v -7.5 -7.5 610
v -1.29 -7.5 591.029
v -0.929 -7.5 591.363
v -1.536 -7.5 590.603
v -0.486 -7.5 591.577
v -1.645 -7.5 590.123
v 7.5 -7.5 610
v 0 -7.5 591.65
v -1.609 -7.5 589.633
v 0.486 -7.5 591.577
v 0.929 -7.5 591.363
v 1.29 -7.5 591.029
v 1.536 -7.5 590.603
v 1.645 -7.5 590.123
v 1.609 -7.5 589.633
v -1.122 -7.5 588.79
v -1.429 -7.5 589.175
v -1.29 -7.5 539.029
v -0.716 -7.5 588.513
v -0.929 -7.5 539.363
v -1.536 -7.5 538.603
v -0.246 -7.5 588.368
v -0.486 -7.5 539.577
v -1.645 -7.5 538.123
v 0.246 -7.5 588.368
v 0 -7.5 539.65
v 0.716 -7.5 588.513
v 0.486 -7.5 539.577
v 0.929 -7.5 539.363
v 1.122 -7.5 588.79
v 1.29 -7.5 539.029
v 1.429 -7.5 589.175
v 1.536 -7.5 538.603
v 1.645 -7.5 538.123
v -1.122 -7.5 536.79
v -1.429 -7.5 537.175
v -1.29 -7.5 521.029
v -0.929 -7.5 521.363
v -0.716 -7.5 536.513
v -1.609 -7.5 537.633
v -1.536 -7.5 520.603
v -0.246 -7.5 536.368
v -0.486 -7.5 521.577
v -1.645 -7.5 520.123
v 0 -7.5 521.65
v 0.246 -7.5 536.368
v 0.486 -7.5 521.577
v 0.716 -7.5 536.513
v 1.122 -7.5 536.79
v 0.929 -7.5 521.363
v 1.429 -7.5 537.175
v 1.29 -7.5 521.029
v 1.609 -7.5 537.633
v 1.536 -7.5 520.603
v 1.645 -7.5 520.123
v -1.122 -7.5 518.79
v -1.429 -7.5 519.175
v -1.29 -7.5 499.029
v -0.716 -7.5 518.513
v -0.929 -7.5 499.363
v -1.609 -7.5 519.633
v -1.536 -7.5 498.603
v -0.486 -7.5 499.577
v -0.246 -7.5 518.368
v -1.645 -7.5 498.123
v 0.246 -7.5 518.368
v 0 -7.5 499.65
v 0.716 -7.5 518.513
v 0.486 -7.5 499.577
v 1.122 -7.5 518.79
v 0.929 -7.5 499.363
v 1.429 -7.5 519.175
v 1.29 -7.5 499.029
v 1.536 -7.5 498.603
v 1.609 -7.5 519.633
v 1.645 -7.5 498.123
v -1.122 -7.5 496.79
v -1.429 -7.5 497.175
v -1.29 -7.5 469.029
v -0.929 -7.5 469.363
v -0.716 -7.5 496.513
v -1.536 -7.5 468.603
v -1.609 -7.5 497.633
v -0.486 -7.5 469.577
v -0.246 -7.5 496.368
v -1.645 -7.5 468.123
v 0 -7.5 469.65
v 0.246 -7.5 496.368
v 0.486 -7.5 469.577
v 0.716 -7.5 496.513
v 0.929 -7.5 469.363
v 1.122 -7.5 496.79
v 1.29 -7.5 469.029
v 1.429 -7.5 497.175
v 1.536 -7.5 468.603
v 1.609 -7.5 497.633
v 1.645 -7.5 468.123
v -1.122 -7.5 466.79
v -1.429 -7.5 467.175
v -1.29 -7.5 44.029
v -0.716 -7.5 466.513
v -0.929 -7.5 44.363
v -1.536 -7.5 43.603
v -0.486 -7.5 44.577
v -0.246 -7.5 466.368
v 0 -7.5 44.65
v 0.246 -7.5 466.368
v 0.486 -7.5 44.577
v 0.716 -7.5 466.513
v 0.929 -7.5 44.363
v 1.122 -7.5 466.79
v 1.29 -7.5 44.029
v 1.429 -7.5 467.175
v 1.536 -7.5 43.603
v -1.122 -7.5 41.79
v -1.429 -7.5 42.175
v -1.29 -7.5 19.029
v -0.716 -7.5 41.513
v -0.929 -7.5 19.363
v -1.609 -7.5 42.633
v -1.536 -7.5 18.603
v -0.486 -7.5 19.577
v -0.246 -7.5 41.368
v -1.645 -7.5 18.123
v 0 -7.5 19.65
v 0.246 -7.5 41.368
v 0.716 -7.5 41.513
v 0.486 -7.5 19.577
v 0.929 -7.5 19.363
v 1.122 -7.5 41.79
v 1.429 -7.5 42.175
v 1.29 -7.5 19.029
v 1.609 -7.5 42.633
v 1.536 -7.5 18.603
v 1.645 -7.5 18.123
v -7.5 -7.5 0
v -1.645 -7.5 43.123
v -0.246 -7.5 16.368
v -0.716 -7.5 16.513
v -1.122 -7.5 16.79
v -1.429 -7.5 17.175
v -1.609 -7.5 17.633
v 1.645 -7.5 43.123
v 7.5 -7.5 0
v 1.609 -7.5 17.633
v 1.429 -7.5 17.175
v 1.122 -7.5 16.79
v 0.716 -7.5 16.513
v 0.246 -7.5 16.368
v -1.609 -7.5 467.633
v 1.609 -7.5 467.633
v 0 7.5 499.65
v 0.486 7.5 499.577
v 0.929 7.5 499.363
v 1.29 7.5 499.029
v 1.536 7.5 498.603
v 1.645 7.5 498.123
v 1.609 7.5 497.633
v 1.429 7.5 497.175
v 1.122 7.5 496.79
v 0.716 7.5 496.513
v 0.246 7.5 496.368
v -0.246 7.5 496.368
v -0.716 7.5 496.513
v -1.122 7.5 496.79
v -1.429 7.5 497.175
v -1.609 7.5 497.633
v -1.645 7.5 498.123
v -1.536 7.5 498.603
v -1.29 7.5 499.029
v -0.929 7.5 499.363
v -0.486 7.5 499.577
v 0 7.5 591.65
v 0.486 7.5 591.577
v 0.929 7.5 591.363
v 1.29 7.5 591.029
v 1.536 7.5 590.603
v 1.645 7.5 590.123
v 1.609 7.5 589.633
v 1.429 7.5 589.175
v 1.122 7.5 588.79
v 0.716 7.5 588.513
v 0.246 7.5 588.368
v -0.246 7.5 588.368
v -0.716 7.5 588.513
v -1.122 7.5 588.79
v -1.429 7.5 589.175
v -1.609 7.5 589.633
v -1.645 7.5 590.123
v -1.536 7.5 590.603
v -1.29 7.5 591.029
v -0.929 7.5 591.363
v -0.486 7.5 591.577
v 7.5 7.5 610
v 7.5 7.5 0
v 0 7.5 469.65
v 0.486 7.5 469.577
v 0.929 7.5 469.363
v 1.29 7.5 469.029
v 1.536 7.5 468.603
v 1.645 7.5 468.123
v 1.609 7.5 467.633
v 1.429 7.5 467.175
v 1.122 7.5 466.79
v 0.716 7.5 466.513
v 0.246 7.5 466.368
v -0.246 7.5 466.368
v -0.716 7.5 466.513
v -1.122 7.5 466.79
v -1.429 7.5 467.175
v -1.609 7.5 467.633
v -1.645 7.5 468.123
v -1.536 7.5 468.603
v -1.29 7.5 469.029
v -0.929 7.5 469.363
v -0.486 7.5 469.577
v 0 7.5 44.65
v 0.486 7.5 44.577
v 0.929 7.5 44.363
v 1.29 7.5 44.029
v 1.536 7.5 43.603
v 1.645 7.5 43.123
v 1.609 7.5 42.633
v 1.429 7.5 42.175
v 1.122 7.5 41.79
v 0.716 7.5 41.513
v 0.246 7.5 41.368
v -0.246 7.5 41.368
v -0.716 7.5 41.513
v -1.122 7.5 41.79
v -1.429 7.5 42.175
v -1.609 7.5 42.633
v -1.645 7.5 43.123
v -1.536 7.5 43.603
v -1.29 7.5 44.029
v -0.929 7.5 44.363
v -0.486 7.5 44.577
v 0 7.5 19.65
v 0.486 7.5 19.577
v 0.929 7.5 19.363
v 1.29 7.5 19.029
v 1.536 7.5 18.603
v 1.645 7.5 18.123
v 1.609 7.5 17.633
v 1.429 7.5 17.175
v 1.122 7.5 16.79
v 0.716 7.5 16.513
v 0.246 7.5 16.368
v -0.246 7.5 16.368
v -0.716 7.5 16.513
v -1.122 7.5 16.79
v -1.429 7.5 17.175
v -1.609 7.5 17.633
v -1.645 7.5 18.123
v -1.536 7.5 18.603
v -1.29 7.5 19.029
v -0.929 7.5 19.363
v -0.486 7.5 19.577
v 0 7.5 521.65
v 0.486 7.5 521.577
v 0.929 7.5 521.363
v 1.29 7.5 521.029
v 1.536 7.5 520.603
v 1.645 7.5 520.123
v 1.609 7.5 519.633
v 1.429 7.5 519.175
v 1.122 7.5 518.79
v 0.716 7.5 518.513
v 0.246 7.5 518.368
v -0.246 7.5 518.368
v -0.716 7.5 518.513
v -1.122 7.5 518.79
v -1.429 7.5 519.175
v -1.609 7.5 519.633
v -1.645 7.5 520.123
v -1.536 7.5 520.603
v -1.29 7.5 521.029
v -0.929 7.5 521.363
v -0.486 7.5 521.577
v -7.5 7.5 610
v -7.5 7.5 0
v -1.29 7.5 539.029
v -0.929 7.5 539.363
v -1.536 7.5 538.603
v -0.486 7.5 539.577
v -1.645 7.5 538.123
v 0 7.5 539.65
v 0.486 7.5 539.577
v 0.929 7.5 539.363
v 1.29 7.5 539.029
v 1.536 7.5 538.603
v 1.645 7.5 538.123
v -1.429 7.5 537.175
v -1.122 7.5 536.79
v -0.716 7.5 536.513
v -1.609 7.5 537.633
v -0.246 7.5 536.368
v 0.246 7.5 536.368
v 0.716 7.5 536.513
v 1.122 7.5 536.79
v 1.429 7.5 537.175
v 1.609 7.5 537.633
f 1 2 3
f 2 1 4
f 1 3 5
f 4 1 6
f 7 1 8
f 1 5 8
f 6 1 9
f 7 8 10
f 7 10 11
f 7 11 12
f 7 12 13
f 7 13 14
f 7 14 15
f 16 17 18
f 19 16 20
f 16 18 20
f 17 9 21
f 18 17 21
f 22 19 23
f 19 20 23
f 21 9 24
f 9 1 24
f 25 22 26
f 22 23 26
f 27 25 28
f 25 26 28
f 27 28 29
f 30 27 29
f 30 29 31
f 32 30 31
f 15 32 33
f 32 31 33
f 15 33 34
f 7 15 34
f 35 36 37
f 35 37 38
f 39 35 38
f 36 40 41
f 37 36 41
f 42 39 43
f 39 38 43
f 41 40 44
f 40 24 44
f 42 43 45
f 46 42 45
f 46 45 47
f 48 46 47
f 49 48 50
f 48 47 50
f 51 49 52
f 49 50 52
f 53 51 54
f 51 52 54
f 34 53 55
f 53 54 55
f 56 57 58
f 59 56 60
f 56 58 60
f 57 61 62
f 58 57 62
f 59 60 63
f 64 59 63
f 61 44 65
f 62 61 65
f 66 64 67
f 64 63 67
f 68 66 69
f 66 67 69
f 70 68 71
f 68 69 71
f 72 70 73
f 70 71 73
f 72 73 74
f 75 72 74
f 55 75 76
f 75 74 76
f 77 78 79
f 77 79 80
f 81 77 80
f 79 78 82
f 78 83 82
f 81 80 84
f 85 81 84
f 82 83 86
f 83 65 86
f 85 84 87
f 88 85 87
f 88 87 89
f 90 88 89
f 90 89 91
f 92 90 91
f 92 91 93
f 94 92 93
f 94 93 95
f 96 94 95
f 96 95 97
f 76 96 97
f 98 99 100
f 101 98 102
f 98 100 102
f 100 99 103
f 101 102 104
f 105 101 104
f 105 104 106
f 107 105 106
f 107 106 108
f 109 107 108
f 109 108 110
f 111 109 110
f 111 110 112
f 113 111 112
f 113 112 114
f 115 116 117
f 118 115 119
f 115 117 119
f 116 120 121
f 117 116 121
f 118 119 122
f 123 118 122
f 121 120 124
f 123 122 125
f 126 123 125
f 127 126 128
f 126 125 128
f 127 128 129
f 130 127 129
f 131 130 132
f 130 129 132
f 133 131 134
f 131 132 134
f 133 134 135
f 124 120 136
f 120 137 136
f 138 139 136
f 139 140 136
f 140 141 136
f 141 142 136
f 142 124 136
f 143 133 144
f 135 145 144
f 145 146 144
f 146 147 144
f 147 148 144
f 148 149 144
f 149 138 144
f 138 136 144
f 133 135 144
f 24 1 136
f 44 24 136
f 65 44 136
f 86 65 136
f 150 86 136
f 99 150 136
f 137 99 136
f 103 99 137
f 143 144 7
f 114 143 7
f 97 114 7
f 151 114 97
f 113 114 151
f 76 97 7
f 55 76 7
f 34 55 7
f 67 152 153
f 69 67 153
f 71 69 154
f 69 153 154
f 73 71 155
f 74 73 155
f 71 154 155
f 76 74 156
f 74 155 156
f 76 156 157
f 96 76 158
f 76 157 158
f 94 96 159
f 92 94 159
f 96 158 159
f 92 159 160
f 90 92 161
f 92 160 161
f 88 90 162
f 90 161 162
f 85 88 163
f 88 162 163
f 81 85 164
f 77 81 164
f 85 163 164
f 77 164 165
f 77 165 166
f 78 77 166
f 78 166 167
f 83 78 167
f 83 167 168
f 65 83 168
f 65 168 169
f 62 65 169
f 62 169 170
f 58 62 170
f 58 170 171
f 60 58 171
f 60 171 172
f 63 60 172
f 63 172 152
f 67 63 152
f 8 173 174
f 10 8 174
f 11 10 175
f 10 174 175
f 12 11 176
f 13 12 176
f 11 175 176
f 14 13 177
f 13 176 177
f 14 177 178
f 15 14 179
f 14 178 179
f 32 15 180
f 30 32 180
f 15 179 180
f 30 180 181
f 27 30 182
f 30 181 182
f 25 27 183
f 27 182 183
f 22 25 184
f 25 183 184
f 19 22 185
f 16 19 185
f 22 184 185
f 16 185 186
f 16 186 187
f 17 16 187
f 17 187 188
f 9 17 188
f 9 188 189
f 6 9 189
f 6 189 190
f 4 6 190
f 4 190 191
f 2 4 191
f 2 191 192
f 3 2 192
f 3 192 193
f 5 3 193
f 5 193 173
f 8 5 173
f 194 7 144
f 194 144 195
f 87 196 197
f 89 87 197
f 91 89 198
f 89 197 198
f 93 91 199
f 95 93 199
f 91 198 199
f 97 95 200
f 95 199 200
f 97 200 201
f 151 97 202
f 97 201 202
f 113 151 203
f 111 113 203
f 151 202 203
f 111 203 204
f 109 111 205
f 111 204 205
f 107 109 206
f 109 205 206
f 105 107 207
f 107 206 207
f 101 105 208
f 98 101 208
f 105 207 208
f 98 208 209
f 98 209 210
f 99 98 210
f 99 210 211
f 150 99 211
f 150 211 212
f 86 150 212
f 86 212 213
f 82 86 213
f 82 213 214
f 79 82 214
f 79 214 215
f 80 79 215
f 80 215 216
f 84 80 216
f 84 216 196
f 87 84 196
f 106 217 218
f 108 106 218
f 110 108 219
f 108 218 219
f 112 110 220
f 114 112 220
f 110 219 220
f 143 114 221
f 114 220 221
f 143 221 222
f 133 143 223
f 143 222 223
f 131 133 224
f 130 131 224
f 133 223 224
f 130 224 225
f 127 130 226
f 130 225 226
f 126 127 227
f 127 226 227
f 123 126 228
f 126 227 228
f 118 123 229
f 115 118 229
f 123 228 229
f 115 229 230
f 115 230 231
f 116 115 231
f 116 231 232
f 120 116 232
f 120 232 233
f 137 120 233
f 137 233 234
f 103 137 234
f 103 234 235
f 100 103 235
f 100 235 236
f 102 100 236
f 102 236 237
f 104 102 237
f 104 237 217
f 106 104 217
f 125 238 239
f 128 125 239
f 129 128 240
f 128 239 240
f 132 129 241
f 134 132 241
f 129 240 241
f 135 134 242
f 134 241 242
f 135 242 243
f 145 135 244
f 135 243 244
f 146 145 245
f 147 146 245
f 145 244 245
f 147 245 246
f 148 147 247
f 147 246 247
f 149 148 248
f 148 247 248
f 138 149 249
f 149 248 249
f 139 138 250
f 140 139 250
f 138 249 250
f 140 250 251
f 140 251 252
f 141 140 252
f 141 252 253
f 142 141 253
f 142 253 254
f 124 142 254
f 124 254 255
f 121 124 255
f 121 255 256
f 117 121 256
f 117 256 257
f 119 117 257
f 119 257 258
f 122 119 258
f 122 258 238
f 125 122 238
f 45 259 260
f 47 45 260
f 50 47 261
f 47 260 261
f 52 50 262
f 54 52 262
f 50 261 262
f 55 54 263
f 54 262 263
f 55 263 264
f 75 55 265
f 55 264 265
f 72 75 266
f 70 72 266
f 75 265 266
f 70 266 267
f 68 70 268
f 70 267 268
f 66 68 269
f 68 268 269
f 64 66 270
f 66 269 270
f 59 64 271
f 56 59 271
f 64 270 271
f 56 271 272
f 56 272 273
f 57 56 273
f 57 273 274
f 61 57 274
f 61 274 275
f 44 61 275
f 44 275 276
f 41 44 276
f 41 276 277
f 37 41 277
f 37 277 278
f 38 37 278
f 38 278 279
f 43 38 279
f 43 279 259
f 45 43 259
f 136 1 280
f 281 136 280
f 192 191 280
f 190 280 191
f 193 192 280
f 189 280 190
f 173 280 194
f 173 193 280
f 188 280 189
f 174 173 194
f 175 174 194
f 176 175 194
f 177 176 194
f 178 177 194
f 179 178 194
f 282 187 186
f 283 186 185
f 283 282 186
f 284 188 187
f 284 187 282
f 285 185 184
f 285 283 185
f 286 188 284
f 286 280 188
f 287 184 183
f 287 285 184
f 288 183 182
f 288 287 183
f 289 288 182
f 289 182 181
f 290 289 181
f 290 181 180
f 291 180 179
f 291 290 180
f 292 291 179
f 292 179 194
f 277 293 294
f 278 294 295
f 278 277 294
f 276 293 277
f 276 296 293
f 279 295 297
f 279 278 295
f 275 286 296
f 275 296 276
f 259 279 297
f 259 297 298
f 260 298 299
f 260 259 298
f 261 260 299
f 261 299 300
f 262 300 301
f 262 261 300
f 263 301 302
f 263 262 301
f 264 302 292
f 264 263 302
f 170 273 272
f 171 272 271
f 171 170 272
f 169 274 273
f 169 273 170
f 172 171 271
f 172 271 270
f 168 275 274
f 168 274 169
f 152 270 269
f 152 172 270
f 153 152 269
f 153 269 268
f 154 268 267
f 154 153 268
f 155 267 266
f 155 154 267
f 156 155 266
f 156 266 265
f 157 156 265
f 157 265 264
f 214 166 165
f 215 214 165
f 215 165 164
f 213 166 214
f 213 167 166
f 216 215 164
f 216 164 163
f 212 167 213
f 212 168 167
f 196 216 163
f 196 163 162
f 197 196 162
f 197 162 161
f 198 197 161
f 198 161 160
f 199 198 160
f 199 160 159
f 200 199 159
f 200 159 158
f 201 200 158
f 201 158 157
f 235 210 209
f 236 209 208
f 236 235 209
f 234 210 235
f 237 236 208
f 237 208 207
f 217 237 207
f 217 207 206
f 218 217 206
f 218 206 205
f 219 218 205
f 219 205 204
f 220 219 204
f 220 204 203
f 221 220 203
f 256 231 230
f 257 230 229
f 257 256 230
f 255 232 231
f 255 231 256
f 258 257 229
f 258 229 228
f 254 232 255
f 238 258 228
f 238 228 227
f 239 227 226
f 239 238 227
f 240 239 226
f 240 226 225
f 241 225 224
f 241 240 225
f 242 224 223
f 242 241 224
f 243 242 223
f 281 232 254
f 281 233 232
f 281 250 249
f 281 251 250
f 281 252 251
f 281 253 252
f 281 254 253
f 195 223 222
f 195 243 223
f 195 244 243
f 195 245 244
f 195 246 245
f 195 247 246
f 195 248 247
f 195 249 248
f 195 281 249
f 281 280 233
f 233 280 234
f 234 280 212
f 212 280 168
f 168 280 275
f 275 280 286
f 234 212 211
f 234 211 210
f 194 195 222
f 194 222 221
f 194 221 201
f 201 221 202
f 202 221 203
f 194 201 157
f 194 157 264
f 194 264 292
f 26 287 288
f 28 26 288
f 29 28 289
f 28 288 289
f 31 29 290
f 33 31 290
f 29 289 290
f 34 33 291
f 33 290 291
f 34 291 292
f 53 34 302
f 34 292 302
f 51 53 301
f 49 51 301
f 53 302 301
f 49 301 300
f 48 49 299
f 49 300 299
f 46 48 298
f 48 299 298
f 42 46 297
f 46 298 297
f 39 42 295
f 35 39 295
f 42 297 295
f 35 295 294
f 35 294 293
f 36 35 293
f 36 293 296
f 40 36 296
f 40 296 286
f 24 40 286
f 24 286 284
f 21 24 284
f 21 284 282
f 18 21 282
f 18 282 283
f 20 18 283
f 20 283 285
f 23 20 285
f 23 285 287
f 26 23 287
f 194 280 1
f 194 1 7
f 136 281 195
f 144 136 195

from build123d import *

# Parameters (mm, degrees)
SKETCH_1_W          = 15
SKETCH_1_H          = 15
EXTRUDE_1_DEPTH     = 610
SKETCH_2_R          = 1.65
CUT_EXTRUDE_1_DEPTH = 20


with BuildPart() as part:
    # 草图1 → 凸台-拉伸1 (new body)
    with BuildSketch(Plane.XY):
        Rectangle(SKETCH_1_W, SKETCH_1_H)
    extrude(amount=EXTRUDE_1_DEPTH)

    # 草图2 → 切除-拉伸1 (cut)
    with BuildSketch(Plane(origin=(0, 7.5, 0), x_dir=(1, 0, 0), z_dir=(0, 1, 0))):
        with Locations(Location((0, -590, 0), (0, 0, 270))):
            Circle(SKETCH_2_R)
        with Locations(Location((0, -520, 0), (0, 0, 270))):
            Circle(SKETCH_2_R)
        with Locations(Location((0, -18, 0), (0, 0, 270))):
            Circle(SKETCH_2_R)
        with Locations(Location((0, -43, 0), (0, 0, 270))):
            Circle(SKETCH_2_R)
        with Locations(Location((0, -498, 0), (0, 0, 270))):
            Circle(SKETCH_2_R)
        with Locations(Location((0, -538, 0), (0, 0, 270))):
            Circle(SKETCH_2_R)
        with Locations(Location((0, -468, 0), (0, 0, 270))):
            Circle(SKETCH_2_R)
    extrude(amount=-CUT_EXTRUDE_1_DEPTH, mode=Mode.SUBTRACT)


solid = part.part
